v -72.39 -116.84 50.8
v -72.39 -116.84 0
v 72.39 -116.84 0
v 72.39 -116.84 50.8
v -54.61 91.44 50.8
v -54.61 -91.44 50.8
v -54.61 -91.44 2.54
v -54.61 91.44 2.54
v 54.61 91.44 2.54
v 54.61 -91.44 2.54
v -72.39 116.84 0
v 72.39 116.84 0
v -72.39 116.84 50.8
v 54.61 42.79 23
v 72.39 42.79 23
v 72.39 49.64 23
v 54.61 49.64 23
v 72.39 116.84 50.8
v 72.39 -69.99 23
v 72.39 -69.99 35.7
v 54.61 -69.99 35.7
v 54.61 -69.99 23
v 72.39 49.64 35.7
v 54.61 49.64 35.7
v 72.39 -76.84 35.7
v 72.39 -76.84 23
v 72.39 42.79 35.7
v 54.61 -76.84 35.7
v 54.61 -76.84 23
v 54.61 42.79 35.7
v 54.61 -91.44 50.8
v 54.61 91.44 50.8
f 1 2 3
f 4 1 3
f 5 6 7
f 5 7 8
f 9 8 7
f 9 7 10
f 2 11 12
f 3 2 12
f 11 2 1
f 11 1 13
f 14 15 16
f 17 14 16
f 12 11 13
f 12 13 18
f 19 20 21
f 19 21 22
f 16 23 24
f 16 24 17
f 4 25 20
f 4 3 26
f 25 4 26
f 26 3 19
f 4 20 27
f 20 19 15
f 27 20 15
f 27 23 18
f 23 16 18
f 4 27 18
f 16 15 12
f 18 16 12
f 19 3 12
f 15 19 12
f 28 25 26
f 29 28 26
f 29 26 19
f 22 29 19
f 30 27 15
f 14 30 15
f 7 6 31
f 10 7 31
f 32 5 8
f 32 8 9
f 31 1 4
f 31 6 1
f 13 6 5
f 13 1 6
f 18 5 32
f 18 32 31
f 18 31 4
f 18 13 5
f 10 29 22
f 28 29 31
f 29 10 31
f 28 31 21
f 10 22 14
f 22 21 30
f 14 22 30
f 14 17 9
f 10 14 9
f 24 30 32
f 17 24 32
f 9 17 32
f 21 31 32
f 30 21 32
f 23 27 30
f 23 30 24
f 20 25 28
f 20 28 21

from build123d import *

# Parameters (mm, degrees)
SKETCH1_W           = 144.78
SKETCH1_H           = 233.68
BOSS_EXTRUDE1_DEPTH = 50.8
SKETCH2_W           = 109.22
SKETCH2_H           = 182.88
CUT_EXTRUDE1_DEPTH  = 48.26
CUT_EXTRUDE3_REACH  = 194.856
SKETCH6_W           = 12.7
SKETCH6_H           = 6.85


with BuildPart() as part:
    # Sketch1 → Boss-Extrude1 (new body)
    with BuildSketch(Plane.XY):
        Rectangle(SKETCH1_W, SKETCH1_H)
    extrude(amount=BOSS_EXTRUDE1_DEPTH)

    # Sketch2 → Cut-Extrude1 (cut)
    with BuildSketch(Plane.XY.offset(50.8)):
        Rectangle(SKETCH2_W, SKETCH2_H)
    extrude(amount=-CUT_EXTRUDE1_DEPTH, mode=Mode.SUBTRACT)

    # Sketch6 → Cut-Extrude3 (cut, up to next)
    with BuildSketch(Plane(origin=(72.39, 0, 0), x_dir=(0, 0, -1), z_dir=(1, 0, 0)), mode=Mode.PRIVATE) as cut_extrude3_sk1:
        with Locations((-29.35, 46.215)):
            Rectangle(SKETCH6_W, SKETCH6_H)
    cut_extrude3_tool1 = extrude(cut_extrude3_sk1.sketch, amount=-CUT_EXTRUDE3_REACH, mode=Mode.PRIVATE) & part.part
    # Sketch6 → Cut-Extrude3 (cut, up to next)
    with BuildSketch(Plane(origin=(72.39, 0, 0), x_dir=(0, 0, -1), z_dir=(1, 0, 0)), mode=Mode.PRIVATE) as cut_extrude3_sk2:
        with Locations((-29.35, -73.415)):
            Rectangle(SKETCH6_W, SKETCH6_H)
    cut_extrude3_tool2 = extrude(cut_extrude3_sk2.sketch, amount=-CUT_EXTRUDE3_REACH, mode=Mode.PRIVATE) & part.part
    add(cut_extrude3_tool1.solids().sort_by_distance((72.39, 46.215, 29.35))[0], mode=Mode.SUBTRACT)
    add(cut_extrude3_tool2.solids().sort_by_distance((72.39, -73.415, 29.35))[0], mode=Mode.SUBTRACT)


solid = part.part
